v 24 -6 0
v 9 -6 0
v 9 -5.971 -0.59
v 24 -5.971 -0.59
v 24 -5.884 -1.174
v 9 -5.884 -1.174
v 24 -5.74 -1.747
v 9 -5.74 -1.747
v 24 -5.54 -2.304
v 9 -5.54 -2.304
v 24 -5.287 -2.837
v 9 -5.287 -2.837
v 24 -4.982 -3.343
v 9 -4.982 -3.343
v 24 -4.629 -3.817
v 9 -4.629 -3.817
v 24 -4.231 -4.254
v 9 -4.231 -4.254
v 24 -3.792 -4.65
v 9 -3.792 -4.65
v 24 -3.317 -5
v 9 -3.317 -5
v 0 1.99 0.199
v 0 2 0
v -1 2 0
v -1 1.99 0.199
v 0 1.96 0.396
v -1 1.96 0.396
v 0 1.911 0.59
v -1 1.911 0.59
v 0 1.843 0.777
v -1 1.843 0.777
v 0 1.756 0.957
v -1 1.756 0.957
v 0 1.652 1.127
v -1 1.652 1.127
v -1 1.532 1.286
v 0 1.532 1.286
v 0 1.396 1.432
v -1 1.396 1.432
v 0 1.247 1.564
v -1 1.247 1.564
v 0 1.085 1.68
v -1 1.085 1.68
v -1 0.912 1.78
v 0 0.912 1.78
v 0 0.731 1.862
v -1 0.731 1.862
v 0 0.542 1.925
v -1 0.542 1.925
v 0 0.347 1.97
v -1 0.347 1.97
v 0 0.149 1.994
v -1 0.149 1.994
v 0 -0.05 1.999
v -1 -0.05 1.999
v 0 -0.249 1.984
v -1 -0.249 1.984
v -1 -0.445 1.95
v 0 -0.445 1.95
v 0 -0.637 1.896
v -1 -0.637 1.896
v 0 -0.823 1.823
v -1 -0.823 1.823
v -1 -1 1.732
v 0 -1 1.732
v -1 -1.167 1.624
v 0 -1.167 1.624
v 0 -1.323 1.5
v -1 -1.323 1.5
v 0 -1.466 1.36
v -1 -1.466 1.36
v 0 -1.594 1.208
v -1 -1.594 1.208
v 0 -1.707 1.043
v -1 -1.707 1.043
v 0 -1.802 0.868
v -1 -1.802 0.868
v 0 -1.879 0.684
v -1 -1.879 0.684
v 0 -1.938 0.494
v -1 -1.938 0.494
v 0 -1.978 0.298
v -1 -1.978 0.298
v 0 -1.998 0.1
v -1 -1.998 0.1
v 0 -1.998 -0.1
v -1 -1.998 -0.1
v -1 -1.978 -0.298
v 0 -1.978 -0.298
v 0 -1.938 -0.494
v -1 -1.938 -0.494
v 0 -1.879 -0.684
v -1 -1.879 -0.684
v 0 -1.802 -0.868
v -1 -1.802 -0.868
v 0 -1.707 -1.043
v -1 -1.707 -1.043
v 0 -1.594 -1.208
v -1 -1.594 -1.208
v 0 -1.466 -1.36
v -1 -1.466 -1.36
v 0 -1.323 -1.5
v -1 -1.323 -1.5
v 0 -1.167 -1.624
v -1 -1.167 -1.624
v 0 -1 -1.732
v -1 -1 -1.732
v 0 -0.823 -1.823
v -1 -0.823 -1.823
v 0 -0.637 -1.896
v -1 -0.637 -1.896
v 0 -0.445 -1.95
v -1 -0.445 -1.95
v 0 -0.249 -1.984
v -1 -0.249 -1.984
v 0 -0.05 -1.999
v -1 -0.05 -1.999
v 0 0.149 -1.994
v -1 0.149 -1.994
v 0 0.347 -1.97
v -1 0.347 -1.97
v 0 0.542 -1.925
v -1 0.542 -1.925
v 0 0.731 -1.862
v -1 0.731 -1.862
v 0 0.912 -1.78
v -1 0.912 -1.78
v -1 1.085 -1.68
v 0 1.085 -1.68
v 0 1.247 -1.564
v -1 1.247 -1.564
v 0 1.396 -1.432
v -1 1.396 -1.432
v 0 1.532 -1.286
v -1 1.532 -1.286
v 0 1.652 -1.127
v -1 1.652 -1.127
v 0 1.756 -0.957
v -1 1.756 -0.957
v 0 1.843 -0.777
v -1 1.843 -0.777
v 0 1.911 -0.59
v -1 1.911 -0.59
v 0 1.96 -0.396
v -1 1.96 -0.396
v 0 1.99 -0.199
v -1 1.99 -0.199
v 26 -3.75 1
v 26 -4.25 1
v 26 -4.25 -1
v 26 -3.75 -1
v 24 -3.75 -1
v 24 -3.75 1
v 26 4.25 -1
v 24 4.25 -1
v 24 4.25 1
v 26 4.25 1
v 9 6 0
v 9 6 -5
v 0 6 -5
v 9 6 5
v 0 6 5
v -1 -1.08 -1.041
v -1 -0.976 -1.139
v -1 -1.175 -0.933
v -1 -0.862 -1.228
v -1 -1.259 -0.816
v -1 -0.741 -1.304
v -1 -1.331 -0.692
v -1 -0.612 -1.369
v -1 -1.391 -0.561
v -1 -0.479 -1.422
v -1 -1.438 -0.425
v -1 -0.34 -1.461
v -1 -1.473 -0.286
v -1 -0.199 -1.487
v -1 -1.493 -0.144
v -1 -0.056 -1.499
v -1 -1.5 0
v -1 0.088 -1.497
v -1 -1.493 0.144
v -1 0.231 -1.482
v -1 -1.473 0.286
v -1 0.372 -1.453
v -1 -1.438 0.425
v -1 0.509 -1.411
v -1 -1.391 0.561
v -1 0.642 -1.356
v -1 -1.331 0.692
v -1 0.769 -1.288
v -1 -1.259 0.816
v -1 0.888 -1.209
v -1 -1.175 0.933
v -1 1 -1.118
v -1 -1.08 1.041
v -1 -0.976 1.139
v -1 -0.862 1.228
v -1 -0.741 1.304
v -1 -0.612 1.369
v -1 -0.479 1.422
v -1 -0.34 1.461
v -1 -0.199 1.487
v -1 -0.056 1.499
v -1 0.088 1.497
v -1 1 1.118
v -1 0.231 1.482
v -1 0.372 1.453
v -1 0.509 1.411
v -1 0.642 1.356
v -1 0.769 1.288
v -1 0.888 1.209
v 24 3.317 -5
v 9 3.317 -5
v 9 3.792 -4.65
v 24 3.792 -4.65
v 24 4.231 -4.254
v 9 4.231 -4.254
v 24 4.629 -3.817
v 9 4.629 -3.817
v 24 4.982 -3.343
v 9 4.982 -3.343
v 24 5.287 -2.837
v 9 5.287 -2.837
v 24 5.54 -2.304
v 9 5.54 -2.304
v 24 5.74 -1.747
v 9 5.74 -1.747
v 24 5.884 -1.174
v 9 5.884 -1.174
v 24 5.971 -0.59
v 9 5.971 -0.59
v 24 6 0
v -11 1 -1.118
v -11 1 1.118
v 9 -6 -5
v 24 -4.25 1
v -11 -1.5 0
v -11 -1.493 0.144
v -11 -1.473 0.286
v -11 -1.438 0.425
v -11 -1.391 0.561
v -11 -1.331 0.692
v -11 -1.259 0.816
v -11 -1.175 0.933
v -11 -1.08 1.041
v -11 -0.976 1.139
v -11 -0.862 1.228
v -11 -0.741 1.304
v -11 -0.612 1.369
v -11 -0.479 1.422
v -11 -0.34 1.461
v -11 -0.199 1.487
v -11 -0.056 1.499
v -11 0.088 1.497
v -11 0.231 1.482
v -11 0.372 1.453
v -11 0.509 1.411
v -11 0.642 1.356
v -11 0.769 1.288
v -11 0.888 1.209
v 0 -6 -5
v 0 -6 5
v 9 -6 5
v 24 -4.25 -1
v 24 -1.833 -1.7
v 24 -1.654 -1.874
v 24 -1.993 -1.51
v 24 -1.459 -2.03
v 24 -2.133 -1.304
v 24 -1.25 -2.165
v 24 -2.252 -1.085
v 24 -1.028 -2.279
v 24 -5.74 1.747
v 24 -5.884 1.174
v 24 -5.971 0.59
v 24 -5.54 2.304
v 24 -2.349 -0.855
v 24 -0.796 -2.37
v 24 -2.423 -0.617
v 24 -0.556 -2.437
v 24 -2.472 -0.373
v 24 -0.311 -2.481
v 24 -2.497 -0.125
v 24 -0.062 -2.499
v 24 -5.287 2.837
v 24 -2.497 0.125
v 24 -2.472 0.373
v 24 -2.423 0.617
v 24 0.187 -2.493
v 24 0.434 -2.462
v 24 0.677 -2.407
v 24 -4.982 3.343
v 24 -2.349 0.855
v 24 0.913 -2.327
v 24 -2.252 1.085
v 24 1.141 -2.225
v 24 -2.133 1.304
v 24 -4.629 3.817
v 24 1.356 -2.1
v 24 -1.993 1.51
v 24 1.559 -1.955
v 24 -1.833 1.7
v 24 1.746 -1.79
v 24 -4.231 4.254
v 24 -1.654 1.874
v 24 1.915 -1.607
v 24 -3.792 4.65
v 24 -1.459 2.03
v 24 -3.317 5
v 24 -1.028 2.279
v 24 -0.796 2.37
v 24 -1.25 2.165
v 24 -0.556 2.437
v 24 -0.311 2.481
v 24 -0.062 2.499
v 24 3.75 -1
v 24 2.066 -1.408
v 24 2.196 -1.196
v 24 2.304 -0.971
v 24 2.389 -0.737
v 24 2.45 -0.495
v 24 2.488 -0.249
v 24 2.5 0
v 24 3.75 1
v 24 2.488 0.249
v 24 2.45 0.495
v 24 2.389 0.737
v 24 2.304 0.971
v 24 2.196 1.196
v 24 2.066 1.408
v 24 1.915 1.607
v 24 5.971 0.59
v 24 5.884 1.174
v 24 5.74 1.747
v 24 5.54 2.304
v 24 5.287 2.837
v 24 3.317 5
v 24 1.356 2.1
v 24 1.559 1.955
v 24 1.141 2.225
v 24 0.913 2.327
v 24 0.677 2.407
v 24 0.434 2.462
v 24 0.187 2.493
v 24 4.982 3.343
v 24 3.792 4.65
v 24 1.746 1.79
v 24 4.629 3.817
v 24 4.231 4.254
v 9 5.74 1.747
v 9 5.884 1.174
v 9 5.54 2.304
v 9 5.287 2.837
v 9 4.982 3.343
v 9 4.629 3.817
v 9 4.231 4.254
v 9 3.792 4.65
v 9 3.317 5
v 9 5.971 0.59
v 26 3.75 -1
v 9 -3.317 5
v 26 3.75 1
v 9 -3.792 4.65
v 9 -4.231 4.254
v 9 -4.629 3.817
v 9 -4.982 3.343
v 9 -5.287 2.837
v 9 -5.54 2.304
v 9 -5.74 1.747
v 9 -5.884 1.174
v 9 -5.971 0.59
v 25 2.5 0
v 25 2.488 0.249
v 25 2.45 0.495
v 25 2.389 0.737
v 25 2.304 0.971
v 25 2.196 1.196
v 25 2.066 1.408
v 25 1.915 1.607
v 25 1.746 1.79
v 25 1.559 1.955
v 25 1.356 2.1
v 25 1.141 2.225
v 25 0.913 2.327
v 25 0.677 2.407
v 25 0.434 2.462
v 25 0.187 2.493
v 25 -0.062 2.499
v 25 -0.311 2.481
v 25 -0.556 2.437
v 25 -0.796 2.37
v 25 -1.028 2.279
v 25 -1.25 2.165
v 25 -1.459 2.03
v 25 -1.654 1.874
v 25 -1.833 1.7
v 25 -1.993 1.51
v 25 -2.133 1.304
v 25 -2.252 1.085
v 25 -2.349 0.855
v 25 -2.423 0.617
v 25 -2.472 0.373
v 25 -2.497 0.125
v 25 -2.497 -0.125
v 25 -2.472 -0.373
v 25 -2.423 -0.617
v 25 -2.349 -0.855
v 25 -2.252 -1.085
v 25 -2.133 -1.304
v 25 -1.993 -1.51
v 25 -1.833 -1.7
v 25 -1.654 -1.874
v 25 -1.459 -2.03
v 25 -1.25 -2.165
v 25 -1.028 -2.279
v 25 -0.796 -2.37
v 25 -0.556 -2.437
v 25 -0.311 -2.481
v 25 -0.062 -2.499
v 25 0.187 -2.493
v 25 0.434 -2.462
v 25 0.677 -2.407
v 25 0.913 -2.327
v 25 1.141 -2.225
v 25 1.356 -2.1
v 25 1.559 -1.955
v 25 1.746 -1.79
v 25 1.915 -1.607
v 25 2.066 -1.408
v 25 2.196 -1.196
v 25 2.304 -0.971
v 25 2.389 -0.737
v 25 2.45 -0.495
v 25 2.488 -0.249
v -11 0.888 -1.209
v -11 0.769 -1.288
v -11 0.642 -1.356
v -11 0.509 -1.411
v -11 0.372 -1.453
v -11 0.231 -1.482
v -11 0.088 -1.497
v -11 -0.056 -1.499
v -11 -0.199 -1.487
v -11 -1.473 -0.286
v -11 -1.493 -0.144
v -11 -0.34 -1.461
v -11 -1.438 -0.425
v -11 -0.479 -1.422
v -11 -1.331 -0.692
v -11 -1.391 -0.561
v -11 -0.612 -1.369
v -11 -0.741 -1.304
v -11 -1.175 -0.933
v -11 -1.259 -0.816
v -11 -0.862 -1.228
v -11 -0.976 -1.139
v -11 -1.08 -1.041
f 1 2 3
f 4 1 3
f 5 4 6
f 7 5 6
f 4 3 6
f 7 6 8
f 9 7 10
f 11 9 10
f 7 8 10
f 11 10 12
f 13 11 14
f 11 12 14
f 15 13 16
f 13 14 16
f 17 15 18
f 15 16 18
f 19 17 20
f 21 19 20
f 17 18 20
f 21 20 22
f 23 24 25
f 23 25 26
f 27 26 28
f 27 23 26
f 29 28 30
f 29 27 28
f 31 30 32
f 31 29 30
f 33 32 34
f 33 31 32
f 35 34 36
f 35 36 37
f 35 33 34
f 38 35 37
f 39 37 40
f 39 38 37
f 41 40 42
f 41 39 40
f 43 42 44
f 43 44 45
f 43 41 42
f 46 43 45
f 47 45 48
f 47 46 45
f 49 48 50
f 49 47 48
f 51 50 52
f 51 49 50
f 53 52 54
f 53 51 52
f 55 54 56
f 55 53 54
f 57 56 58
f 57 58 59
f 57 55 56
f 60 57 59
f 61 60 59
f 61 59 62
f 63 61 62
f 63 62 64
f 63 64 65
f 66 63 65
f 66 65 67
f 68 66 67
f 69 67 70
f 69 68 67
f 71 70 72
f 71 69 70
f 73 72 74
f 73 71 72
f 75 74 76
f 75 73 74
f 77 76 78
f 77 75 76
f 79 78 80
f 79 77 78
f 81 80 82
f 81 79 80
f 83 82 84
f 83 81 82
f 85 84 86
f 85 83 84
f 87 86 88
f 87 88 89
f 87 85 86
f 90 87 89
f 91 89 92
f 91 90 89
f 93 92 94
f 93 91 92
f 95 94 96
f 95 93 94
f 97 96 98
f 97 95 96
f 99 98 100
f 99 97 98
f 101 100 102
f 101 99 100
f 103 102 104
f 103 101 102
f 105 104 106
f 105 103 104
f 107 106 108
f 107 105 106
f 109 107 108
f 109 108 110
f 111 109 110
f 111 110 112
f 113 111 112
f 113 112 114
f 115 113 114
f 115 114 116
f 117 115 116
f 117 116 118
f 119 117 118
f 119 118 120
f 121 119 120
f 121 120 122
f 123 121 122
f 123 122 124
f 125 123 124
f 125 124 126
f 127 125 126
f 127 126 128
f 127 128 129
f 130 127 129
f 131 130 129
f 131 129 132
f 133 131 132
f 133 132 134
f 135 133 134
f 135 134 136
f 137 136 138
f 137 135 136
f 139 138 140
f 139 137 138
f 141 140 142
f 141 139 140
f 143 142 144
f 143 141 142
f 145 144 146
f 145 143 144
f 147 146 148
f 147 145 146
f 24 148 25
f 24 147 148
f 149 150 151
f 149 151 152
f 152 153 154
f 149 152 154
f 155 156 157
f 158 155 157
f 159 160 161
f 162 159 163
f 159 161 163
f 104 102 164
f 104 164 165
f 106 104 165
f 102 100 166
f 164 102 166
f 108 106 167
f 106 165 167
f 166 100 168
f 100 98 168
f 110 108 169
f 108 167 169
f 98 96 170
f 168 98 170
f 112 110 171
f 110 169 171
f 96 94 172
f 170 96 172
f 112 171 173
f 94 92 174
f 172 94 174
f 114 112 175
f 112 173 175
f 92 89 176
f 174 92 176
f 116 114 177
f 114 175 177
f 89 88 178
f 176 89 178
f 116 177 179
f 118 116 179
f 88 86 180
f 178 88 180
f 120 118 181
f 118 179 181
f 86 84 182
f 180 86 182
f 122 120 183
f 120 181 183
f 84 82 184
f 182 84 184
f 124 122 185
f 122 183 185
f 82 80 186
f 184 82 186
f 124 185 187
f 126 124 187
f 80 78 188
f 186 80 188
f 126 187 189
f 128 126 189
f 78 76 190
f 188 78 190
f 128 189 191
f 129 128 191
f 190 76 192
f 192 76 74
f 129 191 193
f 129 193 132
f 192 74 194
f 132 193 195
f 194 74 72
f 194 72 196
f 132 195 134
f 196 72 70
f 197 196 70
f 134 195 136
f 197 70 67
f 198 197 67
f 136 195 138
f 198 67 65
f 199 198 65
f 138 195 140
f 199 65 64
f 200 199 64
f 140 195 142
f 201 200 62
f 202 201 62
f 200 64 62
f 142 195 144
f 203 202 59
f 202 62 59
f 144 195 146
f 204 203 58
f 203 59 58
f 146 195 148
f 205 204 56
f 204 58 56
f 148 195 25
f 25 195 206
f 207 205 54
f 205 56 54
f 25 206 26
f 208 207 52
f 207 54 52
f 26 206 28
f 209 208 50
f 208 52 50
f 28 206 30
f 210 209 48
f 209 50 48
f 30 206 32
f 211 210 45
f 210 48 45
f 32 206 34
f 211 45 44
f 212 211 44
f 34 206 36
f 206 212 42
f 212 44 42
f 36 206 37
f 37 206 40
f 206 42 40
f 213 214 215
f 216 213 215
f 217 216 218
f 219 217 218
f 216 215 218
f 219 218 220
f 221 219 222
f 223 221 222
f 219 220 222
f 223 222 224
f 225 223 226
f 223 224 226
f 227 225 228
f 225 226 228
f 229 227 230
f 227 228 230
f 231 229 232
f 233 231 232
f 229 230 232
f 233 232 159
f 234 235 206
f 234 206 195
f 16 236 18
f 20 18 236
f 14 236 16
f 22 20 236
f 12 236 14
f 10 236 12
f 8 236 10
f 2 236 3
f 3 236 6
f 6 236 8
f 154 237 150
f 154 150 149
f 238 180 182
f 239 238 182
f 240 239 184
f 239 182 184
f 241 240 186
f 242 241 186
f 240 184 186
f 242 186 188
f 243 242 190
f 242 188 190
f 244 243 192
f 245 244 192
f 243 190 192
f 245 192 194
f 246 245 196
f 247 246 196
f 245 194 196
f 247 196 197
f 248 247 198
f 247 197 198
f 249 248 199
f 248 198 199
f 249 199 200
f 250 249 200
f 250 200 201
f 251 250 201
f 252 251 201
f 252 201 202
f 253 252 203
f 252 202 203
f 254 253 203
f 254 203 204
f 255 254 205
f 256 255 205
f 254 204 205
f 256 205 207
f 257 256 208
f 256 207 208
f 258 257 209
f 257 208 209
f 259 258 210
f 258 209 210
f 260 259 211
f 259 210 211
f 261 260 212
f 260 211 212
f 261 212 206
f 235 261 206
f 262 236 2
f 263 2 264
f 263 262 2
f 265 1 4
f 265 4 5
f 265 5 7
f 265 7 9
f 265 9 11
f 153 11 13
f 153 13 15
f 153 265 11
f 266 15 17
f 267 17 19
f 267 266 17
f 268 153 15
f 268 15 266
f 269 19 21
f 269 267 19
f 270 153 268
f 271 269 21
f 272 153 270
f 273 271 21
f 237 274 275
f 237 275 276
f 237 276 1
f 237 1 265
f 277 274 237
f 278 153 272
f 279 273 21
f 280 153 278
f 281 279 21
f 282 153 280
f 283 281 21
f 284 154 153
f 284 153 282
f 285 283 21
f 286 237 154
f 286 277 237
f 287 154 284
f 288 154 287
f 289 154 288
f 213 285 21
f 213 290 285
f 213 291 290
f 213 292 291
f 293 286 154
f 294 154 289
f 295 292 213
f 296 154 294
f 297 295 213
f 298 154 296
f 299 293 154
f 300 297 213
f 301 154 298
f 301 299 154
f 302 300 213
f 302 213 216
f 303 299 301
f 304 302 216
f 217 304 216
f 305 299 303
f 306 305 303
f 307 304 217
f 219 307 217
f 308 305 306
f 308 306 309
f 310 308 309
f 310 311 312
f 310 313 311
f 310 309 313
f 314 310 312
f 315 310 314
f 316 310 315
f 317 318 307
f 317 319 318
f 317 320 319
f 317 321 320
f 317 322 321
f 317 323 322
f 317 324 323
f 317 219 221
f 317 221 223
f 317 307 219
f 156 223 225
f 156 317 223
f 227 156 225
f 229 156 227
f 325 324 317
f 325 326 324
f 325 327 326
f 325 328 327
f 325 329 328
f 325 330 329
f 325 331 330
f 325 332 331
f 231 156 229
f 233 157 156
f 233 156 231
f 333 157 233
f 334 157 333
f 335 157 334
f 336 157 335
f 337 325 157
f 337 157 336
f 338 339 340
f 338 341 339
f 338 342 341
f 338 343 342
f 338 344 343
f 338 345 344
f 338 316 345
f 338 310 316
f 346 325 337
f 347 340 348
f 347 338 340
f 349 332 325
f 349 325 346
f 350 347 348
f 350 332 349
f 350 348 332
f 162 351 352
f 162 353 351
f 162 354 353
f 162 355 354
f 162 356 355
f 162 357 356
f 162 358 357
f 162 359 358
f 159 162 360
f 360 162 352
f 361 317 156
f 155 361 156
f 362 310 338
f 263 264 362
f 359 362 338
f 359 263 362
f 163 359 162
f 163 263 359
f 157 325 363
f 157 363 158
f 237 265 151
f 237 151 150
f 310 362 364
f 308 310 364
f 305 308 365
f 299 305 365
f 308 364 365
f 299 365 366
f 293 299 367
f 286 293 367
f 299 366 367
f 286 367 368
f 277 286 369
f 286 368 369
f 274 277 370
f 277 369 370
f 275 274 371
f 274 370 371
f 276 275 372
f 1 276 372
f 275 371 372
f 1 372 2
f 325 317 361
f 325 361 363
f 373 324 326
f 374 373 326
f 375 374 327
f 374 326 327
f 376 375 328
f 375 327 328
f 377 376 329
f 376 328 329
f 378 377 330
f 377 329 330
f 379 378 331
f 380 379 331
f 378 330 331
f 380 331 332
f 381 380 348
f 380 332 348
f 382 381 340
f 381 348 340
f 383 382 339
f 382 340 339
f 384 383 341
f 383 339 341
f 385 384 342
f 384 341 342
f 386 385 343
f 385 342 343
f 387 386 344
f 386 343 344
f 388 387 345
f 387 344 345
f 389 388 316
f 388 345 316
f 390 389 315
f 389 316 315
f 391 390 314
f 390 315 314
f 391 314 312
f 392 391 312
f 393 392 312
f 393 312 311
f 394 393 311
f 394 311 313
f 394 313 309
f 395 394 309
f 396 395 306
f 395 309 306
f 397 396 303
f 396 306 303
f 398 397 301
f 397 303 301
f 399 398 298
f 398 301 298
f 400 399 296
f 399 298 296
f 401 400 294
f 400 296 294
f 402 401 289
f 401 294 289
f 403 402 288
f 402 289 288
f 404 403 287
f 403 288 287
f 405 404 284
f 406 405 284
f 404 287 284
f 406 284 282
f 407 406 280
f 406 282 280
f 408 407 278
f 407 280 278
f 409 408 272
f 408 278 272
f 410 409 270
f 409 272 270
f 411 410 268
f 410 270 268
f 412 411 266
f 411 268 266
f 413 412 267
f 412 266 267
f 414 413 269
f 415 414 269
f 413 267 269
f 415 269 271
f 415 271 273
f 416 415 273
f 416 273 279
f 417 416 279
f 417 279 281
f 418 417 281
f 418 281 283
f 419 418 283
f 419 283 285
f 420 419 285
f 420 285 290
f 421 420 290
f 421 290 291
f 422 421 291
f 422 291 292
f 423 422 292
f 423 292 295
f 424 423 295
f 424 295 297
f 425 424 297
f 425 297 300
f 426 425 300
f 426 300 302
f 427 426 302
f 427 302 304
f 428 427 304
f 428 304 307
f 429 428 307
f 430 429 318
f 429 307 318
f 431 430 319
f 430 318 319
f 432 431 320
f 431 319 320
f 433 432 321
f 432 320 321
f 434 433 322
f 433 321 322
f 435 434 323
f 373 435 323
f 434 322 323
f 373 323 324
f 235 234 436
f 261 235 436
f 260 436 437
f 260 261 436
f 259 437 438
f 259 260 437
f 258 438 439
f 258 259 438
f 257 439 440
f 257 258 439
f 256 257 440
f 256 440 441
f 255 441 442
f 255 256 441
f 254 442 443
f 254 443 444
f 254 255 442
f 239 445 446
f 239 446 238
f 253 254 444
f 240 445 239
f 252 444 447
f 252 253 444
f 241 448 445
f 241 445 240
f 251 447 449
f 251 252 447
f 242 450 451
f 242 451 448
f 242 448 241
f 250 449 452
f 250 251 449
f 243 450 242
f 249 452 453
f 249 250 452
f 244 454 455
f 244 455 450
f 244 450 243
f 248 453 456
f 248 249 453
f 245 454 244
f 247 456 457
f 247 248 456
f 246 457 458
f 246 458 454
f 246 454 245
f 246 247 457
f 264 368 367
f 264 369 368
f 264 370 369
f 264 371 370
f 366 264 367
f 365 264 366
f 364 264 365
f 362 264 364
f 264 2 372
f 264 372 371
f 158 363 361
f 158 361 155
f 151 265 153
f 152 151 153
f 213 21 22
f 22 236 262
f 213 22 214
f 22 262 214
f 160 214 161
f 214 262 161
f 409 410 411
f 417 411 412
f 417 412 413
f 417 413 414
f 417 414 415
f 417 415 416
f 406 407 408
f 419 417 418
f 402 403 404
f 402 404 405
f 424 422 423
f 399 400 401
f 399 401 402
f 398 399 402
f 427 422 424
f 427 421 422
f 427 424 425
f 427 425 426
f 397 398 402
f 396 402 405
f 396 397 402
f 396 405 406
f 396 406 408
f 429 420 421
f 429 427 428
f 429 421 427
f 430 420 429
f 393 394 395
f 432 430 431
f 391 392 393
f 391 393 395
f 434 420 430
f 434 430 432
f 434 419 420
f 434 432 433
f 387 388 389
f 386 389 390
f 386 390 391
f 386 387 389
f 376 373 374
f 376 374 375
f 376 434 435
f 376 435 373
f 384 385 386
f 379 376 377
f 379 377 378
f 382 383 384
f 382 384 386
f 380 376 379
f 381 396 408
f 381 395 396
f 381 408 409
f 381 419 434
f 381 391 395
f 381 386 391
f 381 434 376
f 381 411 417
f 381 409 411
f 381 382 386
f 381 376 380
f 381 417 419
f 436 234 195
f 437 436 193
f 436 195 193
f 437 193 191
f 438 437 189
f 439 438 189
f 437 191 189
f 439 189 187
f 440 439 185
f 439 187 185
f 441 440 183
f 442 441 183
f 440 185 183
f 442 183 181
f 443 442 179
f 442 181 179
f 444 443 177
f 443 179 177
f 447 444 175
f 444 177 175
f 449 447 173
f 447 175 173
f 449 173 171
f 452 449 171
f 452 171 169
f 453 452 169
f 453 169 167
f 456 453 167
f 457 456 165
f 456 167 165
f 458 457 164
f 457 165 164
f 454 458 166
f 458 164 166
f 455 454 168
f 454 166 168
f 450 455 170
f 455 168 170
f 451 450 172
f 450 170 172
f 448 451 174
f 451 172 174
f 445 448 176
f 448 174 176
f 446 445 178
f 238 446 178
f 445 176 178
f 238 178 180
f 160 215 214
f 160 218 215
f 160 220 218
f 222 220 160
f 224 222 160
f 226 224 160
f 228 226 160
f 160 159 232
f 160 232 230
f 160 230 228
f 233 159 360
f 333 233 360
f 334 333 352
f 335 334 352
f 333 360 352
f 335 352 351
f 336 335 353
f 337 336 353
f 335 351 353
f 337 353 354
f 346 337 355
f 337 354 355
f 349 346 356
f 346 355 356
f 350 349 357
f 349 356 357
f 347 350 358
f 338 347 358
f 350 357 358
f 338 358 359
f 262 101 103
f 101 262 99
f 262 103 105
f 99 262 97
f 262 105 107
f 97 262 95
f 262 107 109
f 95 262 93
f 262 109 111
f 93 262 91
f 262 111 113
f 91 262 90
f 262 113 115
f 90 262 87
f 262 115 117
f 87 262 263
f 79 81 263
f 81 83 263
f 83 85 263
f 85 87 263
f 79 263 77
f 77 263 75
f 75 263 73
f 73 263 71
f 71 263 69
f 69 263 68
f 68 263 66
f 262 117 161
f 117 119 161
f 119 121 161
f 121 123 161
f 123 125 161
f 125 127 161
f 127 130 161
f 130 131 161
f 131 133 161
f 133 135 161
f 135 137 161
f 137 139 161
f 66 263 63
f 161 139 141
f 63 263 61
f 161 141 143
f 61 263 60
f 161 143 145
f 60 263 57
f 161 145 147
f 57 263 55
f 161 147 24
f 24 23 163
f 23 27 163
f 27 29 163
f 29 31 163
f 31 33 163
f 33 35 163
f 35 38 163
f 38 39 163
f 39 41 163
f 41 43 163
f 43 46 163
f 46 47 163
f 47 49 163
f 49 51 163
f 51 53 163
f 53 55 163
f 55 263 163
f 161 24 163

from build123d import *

# Parameters (mm, degrees)
F0_W     = 12
F0_H     = 10
F0_R     = 2
F1_DEPTH = 9
F2_DEPTH = 1
F4_DEPTH = 10
F6_DEPTH = 15
F7_R     = 2.5
F8_DEPTH = 1
F7_W     = 0.5
F7_H     = 2
F9_DEPTH = 2


with BuildPart() as f1:
    # F0 (on Right) → F1 (new body)
    with BuildSketch(Plane.YZ):
        Rectangle(F0_W, F0_H)
        Circle(F0_R, mode=Mode.SUBTRACT)
        Circle(F0_R)
    extrude(amount=F1_DEPTH)

    # F0 (on Right) → F2 (join)
    with BuildSketch(Plane.YZ):
        Circle(F0_R)
    extrude(amount=-F2_DEPTH)

    # F3 (on face) → F4 (join)
    with BuildSketch(Plane(origin=(-1, 0, 0), x_dir=(0, -1, 0), z_dir=(-1, 0, 0))):
        with BuildLine():
            ThreePointArc((-1, -1.118034), (0.612372, -1.369306), (1.5, 0))
            ThreePointArc((1.5, 0), (0.612372, 1.369306), (-1, 1.118034))
            Line((-1, 1.118034), (-1, -1.118034))
        make_face()
    extrude(amount=F4_DEPTH)

    # F5 (on face) → F6 (join)
    with BuildSketch(Plane.YZ.offset(9)):
        with BuildLine():
            Line((3.316625, 5), (-3.316625, 5))
            ThreePointArc((-3.316625, 5), (-5.286764, 2.837274), (-6, 0))
            ThreePointArc((-6, 0), (-5.286764, -2.837274), (-3.316625, -5))
            Line((-3.316625, -5), (3.316625, -5))
            ThreePointArc((3.316625, -5), (5.286764, -2.837274), (6, 0))
            ThreePointArc((6, 0), (5.286764, 2.837274), (3.316625, 5))
        make_face()
    extrude(amount=F6_DEPTH)

    # F7 (on face) → F8 (join)
    with BuildSketch(Plane.YZ.offset(24)):
        Circle(F7_R)
    extrude(amount=F8_DEPTH)

    # F7 (on face) → F9 (join)
    with BuildSketch(Plane.YZ.offset(24)):
        with Locations((-4, 0)):
            Rectangle(F7_W, F7_H)
        with Locations((4, 0)):
            Rectangle(F7_W, F7_H)
    extrude(amount=F9_DEPTH)


solid = f1.part
